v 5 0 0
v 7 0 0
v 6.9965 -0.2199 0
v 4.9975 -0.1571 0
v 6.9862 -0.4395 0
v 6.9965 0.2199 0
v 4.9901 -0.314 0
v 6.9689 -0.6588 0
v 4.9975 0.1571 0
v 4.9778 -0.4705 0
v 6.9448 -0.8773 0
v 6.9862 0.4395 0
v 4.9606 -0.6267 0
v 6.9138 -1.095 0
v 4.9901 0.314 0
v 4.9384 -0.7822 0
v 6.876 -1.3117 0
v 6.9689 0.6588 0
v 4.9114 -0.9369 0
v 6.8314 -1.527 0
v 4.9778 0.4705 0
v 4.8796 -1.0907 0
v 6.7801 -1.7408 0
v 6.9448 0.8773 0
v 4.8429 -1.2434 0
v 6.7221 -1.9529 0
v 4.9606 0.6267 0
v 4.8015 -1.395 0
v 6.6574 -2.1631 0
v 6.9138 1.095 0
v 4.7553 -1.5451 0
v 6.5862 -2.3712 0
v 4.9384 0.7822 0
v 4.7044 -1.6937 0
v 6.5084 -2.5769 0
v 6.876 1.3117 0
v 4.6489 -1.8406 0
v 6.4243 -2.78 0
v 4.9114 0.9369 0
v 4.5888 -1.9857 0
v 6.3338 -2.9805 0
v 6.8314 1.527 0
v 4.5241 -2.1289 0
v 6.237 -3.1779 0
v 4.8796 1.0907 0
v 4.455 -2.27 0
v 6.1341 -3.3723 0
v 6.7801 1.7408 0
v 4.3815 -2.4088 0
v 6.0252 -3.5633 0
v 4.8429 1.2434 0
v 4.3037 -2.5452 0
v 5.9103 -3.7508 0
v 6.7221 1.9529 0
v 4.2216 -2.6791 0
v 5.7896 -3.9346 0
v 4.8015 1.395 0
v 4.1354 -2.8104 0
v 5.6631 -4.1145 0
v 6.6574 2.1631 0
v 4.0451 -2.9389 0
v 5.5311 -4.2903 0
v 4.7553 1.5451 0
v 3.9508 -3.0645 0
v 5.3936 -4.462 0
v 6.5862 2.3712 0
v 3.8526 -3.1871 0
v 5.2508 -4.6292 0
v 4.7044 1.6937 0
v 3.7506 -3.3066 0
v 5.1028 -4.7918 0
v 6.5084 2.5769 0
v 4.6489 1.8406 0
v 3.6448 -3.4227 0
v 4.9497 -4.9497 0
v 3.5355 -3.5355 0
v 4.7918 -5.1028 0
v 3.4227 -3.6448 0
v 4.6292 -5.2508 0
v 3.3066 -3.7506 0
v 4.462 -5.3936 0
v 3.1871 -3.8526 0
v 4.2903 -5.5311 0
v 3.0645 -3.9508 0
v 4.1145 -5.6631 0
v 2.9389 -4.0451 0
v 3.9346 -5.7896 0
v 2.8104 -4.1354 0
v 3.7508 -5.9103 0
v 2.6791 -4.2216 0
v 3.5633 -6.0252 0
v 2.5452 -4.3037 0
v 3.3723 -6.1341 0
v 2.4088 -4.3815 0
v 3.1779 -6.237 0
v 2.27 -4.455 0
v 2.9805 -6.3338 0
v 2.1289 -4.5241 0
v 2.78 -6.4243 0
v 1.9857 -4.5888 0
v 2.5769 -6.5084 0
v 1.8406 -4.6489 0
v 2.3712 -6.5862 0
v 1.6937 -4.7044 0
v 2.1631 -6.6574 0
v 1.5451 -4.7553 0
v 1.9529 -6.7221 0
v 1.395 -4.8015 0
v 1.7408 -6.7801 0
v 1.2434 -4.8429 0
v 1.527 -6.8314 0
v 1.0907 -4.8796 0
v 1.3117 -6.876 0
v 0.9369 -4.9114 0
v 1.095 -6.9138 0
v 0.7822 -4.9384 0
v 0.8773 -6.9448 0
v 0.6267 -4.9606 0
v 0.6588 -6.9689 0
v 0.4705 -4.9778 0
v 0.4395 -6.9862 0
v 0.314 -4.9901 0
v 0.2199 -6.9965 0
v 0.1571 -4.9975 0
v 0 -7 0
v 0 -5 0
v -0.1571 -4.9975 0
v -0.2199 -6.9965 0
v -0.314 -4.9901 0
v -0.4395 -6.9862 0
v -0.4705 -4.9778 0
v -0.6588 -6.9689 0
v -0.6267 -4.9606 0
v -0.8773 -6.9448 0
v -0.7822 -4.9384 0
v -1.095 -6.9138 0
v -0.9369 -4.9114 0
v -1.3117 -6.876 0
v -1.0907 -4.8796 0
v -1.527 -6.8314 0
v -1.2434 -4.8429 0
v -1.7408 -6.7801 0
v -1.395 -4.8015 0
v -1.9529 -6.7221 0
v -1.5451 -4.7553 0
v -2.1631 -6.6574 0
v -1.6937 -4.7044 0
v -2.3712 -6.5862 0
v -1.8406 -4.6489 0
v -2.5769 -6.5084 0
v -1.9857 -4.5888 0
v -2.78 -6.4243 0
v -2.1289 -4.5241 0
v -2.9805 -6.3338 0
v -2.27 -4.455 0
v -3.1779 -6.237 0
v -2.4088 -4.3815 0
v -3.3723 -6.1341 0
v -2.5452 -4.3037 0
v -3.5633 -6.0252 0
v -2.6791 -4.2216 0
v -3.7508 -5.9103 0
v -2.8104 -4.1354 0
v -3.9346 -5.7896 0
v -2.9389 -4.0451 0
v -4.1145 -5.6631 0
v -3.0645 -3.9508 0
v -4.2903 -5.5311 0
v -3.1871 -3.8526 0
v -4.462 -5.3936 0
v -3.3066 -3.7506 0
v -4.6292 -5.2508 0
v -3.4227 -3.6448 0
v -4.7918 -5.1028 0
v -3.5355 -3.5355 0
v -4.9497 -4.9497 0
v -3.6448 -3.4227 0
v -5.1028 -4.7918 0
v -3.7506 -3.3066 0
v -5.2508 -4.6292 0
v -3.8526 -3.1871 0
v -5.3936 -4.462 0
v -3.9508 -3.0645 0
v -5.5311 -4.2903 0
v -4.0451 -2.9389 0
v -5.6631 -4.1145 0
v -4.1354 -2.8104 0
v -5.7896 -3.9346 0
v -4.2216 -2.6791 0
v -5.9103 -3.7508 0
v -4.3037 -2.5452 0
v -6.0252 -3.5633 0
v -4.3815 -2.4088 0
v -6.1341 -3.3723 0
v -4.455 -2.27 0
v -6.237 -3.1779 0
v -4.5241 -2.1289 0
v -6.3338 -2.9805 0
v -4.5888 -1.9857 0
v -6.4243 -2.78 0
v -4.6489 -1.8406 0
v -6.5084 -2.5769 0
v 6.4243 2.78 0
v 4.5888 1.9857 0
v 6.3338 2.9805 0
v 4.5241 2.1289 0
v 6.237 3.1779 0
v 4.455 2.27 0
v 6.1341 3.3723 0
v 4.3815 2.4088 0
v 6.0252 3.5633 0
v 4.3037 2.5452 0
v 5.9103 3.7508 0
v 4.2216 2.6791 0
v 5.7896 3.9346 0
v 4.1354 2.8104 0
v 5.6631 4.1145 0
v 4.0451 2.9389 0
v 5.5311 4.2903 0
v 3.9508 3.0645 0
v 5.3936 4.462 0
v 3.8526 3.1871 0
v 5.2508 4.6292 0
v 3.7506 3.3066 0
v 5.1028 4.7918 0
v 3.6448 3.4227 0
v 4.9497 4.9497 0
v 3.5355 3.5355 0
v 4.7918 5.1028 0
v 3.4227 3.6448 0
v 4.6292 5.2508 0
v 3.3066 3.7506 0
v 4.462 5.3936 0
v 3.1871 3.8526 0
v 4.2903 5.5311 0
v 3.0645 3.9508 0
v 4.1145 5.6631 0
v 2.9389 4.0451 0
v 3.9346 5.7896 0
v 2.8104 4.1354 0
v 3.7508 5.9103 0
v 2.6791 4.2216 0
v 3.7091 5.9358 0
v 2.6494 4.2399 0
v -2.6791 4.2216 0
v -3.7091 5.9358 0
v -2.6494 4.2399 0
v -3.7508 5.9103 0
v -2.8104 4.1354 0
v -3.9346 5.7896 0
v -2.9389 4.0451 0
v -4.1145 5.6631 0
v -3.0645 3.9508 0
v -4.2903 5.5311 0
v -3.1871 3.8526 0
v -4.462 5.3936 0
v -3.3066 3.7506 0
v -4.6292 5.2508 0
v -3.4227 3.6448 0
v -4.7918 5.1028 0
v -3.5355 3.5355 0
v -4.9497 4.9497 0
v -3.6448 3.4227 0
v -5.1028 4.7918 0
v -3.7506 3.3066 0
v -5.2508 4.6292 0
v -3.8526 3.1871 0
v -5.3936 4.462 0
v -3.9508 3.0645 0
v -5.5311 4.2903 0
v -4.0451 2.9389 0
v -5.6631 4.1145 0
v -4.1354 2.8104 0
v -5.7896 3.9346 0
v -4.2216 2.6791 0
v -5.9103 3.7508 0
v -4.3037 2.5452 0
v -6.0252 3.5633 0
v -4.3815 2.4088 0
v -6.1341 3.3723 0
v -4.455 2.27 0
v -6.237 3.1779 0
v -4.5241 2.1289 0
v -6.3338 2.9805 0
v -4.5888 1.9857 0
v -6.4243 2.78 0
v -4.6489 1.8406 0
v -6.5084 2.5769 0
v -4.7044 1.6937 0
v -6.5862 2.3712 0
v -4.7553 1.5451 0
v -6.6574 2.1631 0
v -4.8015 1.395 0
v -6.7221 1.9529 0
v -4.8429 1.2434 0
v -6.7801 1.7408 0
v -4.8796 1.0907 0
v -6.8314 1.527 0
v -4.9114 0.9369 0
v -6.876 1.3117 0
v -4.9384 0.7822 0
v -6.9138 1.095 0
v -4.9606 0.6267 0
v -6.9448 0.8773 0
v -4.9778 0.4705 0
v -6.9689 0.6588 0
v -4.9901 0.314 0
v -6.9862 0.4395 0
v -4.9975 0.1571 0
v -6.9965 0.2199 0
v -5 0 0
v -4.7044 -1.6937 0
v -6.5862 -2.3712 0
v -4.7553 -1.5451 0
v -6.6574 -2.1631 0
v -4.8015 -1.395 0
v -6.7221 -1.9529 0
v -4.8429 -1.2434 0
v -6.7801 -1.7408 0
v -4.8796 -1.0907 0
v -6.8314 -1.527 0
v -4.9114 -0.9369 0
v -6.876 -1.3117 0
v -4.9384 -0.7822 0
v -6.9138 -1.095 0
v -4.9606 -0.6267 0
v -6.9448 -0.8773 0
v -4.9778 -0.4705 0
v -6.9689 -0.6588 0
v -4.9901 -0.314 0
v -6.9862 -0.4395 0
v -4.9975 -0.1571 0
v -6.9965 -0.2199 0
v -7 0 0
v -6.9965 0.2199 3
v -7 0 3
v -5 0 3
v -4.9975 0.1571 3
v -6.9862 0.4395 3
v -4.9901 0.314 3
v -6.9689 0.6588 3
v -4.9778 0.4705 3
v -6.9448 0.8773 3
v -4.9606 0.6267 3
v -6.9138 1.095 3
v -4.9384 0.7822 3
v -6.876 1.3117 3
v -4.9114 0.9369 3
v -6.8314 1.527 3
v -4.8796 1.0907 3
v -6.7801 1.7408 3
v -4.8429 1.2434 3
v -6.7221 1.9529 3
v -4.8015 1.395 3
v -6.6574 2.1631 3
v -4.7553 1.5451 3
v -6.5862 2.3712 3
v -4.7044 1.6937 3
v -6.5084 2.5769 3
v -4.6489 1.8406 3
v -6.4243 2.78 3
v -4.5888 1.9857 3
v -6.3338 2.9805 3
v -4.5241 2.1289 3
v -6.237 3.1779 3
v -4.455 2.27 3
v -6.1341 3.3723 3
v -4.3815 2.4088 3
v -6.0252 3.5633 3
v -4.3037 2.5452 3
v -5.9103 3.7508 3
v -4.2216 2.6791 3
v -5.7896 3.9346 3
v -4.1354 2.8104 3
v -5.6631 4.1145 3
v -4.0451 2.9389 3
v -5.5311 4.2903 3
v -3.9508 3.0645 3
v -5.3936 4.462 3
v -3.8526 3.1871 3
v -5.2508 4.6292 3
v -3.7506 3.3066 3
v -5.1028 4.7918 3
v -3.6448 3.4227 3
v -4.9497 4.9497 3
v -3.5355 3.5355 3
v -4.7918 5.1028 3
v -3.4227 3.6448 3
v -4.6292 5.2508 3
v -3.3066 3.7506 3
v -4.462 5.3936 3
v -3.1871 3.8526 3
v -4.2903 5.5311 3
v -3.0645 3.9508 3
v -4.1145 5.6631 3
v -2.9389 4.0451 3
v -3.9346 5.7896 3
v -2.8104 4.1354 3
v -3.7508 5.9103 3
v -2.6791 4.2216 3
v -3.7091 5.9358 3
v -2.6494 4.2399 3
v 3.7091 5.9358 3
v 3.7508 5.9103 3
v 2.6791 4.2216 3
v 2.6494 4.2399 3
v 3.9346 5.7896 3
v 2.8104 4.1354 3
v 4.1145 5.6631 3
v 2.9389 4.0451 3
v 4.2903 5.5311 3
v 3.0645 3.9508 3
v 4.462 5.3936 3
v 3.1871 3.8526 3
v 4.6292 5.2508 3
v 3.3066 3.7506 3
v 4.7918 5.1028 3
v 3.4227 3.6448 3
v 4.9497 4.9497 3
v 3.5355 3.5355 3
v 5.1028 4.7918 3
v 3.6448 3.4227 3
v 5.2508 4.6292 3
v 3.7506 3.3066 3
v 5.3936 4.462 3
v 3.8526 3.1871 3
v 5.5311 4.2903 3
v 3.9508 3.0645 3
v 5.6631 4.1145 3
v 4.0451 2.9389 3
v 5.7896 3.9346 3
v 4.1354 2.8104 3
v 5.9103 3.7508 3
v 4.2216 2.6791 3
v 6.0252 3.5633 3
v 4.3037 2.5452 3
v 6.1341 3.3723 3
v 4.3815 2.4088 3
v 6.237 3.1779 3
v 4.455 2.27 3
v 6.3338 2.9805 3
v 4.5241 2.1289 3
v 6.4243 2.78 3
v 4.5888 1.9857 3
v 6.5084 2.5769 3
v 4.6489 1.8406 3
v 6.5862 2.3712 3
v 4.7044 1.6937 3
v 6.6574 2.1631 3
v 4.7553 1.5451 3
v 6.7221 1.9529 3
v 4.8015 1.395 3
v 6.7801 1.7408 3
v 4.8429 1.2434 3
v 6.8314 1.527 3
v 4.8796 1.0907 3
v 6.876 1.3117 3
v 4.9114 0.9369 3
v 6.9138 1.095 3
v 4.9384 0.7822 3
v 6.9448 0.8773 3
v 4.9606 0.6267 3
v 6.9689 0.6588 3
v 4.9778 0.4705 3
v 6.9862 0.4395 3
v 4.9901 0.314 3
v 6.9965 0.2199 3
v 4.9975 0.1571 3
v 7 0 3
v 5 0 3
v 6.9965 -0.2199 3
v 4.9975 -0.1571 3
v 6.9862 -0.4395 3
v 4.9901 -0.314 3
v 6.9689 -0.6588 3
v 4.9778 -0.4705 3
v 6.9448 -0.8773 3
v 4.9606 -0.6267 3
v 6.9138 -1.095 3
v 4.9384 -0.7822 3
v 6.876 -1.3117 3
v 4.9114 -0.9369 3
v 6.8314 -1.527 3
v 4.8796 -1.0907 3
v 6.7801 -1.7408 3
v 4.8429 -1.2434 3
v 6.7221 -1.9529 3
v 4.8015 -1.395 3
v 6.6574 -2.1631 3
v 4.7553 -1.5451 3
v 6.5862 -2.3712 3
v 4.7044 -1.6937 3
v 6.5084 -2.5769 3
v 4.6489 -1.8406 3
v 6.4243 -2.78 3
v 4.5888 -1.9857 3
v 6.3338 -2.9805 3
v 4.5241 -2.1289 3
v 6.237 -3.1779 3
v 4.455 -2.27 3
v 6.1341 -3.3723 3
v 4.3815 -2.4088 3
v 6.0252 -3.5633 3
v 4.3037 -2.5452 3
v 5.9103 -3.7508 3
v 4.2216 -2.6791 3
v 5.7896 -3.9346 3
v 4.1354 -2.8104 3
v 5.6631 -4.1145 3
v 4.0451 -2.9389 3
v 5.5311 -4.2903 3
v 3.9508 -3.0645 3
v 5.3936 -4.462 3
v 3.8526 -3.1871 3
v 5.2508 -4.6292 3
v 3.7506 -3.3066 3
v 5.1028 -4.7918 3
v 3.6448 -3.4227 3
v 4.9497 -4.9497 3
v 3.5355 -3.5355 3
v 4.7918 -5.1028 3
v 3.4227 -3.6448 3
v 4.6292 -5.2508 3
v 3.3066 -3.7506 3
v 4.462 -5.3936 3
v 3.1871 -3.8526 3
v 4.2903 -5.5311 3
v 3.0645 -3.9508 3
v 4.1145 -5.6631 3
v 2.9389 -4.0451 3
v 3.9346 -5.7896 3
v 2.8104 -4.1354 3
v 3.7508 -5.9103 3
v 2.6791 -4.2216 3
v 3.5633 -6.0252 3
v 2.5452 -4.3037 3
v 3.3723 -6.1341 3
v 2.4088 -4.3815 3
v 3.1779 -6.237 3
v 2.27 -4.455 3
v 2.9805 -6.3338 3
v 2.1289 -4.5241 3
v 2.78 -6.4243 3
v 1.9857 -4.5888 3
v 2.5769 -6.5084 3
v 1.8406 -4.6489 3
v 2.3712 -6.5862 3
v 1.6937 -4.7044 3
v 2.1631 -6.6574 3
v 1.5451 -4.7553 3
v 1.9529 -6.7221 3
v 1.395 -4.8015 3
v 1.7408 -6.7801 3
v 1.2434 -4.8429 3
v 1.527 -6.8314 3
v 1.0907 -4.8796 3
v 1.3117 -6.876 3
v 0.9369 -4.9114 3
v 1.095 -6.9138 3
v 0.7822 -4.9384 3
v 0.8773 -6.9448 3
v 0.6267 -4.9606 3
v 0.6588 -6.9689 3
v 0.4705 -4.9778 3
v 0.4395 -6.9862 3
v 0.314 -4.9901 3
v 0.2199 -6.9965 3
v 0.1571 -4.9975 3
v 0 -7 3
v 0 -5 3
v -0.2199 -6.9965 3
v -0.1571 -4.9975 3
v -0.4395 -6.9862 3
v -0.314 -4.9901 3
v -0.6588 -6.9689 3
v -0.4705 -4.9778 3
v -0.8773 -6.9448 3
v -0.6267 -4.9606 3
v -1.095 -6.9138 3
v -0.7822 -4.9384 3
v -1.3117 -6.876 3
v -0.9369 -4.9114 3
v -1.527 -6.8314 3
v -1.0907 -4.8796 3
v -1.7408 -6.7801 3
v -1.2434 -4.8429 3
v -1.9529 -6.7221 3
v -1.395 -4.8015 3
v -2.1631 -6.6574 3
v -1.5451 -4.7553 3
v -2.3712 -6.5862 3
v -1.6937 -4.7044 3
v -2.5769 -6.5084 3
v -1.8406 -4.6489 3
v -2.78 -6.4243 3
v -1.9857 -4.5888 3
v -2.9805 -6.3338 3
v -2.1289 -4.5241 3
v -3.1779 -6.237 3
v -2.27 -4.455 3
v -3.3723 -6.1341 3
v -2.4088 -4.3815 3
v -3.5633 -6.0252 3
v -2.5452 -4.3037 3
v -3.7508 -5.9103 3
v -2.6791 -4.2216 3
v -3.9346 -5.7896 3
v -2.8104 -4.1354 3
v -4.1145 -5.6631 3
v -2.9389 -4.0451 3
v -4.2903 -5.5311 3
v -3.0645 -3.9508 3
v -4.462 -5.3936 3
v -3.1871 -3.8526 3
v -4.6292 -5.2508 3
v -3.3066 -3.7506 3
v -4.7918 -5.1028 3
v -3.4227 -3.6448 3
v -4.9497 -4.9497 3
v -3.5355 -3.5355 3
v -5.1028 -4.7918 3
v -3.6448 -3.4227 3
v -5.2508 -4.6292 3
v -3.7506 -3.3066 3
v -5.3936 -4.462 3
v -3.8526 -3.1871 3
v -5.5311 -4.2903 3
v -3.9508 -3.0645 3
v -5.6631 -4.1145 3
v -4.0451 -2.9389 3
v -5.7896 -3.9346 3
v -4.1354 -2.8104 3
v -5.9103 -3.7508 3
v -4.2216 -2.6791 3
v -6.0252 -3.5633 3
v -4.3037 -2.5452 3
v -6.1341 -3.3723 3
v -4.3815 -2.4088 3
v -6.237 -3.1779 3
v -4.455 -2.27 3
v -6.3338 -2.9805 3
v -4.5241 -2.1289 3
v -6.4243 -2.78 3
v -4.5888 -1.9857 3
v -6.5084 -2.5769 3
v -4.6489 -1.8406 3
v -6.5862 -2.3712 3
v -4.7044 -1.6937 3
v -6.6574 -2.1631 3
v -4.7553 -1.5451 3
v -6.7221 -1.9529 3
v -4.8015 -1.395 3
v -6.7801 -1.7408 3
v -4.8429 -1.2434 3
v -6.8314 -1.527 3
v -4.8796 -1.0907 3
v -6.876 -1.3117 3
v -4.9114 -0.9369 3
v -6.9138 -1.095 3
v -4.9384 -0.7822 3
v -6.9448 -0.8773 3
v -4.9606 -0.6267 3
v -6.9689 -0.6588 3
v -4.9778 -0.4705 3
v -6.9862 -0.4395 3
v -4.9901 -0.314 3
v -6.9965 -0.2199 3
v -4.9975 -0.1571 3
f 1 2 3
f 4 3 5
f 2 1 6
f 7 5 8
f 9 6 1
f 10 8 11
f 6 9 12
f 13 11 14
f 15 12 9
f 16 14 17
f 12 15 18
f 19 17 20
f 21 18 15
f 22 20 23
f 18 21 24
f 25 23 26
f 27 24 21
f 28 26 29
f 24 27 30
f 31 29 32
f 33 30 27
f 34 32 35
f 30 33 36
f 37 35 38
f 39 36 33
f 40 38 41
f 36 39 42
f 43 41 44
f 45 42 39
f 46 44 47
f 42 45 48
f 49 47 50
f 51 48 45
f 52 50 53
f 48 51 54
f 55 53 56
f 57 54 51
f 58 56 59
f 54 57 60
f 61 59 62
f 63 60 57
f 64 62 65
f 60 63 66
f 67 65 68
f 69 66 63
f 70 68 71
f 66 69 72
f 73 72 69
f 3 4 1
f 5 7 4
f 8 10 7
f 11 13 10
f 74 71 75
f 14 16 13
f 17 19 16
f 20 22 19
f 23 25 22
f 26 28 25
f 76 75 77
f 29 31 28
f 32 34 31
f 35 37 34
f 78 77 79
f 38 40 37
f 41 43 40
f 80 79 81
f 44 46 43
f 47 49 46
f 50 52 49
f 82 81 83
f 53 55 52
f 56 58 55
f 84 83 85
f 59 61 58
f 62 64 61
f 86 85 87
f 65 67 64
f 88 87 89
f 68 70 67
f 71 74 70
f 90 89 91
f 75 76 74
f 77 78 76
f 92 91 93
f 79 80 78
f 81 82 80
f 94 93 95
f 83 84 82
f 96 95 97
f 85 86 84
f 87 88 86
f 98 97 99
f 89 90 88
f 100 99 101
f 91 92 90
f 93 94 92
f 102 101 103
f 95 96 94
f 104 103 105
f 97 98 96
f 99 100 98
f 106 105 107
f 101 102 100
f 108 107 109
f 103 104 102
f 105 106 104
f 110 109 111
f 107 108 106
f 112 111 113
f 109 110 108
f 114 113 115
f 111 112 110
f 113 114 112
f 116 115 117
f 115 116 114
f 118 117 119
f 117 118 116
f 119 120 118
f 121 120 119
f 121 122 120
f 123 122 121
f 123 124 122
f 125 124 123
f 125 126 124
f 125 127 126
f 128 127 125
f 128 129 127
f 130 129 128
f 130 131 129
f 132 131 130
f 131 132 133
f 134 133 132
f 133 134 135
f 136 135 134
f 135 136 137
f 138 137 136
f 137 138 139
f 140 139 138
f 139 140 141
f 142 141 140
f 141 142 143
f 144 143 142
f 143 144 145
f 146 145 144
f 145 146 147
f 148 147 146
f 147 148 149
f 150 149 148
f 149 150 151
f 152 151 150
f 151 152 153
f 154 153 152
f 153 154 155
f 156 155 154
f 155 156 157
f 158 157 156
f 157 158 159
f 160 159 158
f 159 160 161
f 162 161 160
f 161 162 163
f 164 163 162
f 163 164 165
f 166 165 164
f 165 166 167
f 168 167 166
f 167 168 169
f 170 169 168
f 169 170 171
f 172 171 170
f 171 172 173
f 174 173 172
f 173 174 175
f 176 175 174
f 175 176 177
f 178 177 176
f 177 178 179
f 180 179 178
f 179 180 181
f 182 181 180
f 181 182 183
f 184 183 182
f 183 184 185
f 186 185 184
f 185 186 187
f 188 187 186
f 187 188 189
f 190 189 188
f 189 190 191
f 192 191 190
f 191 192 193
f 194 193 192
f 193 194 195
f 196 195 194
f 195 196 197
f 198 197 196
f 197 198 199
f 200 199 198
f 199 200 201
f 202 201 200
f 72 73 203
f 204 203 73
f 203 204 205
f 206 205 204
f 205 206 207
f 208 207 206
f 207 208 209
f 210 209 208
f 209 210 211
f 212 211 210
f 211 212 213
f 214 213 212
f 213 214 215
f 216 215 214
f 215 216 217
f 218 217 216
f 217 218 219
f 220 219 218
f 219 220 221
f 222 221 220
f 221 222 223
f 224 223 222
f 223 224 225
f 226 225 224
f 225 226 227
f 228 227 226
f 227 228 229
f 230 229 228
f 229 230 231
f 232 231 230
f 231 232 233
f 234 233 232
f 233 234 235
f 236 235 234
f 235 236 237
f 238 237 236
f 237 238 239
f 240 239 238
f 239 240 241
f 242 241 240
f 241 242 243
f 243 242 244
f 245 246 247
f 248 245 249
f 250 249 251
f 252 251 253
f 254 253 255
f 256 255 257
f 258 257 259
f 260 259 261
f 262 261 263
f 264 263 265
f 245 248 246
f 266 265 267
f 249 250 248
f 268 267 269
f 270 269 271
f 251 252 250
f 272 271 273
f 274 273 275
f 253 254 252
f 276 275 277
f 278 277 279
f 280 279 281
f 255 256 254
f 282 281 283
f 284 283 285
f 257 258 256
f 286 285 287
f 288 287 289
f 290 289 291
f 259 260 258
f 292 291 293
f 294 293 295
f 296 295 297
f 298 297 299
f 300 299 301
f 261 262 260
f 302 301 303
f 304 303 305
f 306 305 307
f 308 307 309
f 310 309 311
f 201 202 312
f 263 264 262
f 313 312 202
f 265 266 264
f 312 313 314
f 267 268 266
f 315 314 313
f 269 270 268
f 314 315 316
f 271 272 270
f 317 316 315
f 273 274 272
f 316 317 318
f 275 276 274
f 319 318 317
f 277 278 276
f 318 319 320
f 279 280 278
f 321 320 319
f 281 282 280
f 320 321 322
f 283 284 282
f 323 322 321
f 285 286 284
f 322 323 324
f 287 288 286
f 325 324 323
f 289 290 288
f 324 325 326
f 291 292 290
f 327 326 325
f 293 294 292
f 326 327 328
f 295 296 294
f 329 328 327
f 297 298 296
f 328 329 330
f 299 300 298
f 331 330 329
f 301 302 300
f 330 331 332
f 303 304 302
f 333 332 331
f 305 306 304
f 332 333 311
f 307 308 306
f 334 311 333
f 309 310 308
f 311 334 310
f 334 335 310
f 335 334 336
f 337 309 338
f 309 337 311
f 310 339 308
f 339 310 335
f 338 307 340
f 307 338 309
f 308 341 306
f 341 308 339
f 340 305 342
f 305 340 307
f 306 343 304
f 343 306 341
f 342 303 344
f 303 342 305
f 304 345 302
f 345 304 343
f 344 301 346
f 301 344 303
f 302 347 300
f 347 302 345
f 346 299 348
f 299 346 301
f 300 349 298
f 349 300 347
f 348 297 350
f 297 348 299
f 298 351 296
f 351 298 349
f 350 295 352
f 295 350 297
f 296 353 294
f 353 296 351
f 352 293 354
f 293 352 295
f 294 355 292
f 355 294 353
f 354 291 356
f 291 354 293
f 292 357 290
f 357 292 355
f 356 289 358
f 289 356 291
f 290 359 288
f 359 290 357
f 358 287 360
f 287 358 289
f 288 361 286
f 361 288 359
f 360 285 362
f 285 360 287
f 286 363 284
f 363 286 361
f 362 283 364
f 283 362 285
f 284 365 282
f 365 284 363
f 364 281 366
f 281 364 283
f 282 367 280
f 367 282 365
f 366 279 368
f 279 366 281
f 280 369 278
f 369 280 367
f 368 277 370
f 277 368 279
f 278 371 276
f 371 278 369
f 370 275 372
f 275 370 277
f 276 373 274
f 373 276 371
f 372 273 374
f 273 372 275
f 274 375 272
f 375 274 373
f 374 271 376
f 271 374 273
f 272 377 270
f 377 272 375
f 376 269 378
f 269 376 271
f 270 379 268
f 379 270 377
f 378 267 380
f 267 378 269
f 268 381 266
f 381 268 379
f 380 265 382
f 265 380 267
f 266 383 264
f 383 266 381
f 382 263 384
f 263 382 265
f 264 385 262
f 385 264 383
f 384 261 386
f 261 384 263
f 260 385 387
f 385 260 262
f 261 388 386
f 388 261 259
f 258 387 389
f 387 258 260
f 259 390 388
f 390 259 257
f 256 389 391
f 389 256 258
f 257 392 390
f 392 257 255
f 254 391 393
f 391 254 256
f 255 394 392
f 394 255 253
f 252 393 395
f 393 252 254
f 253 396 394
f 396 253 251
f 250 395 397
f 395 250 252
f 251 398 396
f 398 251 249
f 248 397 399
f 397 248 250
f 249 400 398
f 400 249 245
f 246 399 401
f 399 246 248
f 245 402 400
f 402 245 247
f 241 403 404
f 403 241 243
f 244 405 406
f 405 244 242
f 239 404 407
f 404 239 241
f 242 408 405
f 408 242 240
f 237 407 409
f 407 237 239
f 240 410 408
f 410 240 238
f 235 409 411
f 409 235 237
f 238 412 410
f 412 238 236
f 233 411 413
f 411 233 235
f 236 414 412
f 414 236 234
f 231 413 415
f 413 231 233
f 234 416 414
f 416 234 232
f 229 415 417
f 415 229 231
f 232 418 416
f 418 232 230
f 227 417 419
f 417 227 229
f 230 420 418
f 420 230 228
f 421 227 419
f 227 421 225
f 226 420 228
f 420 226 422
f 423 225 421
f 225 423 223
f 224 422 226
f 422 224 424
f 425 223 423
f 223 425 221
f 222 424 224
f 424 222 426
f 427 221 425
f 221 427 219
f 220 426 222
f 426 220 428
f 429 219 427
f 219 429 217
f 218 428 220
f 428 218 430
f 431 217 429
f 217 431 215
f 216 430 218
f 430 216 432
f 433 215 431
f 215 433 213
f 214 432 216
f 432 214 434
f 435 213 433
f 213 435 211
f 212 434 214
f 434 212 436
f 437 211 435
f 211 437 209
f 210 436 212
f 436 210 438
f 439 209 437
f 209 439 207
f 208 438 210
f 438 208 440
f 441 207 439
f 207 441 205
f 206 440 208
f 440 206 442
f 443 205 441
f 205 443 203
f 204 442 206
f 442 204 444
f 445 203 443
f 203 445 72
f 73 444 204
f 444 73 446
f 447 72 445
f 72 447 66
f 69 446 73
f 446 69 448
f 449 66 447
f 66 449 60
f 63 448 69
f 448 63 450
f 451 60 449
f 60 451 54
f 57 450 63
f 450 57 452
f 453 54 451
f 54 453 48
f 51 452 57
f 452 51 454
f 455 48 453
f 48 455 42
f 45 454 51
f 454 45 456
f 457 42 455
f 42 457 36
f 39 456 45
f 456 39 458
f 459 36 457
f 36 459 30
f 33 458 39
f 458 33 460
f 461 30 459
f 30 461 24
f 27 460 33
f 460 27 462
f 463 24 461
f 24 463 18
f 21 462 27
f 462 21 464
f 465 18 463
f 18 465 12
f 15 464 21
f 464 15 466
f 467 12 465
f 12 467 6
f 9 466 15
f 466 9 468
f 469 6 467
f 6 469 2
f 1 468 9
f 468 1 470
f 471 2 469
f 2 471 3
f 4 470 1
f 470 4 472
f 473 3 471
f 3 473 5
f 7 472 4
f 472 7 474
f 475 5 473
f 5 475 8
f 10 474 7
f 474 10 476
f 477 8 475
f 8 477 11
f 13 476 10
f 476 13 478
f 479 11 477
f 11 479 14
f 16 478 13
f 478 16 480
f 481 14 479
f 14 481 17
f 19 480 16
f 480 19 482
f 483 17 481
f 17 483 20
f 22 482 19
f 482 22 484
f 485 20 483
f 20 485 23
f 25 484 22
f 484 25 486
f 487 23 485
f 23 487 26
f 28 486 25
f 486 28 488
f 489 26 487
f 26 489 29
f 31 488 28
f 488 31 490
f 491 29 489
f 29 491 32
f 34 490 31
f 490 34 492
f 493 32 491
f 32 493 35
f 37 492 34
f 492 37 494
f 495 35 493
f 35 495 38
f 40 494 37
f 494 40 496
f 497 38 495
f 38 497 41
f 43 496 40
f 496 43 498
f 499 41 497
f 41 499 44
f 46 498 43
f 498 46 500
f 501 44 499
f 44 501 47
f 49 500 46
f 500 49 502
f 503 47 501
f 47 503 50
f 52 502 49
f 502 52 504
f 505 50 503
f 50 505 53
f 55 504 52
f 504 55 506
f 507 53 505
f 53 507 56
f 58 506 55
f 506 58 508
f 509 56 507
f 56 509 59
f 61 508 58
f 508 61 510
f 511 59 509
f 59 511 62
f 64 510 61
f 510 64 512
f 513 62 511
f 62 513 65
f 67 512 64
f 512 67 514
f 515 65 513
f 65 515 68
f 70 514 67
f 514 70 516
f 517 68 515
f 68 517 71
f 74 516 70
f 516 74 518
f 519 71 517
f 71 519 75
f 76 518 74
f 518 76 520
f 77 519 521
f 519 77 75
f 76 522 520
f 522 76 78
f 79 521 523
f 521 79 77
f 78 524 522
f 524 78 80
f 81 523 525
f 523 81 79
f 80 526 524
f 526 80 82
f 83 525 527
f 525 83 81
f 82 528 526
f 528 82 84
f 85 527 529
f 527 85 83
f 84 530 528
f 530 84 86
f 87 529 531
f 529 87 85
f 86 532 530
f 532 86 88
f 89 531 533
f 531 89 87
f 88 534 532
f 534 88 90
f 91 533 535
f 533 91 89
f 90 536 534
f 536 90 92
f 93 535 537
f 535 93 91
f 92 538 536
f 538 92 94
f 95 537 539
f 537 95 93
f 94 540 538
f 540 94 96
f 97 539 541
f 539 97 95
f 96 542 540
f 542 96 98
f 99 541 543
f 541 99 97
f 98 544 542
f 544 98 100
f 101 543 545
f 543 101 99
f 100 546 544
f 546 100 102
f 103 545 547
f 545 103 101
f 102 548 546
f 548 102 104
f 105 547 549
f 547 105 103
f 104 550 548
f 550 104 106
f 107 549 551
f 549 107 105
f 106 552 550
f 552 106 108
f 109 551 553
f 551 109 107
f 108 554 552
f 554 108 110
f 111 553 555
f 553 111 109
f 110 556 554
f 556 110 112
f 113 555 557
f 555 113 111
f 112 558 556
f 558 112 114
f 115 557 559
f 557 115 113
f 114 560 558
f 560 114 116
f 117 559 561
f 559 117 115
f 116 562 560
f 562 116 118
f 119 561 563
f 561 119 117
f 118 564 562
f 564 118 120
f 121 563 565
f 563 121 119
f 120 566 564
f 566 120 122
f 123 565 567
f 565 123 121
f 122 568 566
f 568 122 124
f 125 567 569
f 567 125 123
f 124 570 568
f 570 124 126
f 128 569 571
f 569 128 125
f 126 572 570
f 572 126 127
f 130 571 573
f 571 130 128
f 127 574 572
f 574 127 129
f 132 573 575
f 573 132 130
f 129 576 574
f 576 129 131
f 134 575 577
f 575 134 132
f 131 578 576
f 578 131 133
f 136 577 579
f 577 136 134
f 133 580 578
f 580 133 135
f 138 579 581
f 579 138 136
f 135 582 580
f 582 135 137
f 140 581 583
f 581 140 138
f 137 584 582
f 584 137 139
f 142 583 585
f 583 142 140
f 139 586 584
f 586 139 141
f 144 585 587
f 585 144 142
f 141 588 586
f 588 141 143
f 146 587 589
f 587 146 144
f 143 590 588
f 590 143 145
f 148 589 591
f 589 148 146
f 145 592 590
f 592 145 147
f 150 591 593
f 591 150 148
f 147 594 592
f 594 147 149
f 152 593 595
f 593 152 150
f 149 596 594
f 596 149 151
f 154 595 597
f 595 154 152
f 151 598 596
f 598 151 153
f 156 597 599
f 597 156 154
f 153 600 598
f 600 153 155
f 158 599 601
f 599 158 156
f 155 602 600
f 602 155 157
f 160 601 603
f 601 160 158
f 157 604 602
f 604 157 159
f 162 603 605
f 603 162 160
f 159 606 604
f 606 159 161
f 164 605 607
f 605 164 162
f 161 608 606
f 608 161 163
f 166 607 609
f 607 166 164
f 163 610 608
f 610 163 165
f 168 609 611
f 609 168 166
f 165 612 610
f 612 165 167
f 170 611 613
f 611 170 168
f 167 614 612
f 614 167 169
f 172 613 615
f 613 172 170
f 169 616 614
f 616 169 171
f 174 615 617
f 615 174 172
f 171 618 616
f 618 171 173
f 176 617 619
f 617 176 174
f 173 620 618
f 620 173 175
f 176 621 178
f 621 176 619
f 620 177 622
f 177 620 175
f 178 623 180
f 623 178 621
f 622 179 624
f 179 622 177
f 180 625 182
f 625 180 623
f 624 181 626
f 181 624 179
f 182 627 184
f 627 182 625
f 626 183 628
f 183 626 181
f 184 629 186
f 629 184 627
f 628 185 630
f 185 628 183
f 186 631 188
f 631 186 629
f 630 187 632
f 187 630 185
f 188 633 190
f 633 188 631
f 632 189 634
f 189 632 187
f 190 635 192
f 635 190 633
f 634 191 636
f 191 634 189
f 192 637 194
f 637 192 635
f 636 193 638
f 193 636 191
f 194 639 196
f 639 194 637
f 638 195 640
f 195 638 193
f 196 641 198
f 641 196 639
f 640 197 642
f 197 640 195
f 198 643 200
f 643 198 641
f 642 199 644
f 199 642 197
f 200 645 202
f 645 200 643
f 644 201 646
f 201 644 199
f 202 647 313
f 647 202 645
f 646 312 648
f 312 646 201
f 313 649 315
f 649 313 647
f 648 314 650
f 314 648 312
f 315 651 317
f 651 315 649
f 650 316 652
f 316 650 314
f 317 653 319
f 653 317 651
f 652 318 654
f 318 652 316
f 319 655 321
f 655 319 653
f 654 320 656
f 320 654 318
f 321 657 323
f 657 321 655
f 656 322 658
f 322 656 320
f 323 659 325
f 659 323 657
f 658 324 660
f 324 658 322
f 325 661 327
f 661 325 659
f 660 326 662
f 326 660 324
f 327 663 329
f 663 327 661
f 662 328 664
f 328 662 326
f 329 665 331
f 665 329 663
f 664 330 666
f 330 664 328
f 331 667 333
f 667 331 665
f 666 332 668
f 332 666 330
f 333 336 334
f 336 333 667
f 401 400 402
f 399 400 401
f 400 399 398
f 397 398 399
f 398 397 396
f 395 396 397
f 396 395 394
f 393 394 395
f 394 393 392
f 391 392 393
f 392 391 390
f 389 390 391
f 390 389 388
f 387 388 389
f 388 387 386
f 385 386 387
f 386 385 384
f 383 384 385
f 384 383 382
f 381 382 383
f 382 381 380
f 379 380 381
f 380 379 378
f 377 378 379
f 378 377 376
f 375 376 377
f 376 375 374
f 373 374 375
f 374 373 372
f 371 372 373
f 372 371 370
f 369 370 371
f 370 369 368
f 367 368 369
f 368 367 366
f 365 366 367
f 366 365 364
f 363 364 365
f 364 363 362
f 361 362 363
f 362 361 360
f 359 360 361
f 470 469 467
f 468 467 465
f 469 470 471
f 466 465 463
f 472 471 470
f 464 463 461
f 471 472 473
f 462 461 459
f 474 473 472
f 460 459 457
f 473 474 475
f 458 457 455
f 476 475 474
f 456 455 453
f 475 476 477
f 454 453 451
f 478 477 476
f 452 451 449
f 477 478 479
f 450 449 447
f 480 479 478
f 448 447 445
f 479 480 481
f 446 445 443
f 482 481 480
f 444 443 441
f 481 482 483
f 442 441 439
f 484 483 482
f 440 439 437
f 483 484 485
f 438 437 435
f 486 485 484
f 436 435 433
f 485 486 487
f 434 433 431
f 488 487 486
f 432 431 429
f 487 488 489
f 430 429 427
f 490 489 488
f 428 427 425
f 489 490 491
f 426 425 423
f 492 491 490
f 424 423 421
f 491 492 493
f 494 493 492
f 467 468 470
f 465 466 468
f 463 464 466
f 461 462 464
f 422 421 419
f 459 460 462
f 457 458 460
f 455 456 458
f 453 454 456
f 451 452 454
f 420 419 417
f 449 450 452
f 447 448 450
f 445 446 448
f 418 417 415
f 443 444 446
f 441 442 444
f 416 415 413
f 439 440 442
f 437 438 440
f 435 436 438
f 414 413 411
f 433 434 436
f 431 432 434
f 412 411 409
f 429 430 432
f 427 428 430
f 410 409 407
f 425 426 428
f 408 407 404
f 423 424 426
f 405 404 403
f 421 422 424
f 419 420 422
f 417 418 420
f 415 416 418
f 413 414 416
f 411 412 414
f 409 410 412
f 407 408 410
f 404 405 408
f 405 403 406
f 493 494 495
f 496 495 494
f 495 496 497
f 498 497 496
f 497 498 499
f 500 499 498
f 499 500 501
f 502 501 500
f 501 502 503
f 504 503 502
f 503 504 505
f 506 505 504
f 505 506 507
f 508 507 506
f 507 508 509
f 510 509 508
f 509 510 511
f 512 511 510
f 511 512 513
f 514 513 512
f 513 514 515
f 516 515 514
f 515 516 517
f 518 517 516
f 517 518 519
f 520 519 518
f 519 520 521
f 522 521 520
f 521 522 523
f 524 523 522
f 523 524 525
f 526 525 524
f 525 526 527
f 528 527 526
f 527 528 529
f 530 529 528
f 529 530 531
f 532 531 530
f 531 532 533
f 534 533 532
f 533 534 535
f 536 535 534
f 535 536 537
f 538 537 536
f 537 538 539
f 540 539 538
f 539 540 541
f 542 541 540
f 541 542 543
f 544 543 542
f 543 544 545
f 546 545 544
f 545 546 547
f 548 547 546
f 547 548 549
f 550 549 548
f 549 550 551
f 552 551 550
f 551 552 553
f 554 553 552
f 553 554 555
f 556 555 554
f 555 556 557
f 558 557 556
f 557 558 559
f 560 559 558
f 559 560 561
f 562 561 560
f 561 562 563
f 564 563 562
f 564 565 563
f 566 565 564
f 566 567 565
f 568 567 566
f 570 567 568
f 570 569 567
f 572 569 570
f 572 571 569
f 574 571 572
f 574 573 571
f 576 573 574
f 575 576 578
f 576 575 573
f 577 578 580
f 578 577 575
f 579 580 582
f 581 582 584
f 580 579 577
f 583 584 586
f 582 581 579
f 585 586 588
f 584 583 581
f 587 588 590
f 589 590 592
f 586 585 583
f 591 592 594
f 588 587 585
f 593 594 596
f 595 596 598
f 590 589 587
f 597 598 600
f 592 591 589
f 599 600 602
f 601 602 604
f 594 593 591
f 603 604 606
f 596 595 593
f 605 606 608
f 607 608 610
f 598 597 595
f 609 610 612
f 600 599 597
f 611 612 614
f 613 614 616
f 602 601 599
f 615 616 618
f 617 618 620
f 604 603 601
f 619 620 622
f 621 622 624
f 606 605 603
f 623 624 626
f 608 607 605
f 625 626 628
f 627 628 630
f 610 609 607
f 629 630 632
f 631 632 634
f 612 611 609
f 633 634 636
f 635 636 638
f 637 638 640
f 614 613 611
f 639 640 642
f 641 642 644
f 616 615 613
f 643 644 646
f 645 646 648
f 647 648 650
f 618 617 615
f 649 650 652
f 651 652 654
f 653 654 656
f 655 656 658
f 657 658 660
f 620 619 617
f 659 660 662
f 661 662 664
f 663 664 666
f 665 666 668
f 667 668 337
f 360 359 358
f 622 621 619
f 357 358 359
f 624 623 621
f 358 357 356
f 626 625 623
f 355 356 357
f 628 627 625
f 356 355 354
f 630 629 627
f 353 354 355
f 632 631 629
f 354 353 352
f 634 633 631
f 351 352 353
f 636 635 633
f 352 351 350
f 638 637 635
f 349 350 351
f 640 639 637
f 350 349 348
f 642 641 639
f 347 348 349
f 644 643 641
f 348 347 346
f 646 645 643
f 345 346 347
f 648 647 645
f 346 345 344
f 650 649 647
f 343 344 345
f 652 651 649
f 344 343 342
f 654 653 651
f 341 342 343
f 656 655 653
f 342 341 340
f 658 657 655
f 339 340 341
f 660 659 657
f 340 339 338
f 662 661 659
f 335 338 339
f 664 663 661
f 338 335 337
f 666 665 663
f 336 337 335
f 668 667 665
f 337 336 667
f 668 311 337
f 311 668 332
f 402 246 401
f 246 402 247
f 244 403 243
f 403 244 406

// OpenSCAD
// [FL_INDEX: keywords="openscad, 3d_parametric, Find_your_thing__Clip, csg_solid" | COT="Parametric OpenSCAD design from 3DCodeverse"]
// Title: "Find your thing" Clip

// Inner diameter
diameter = 10;

// Wall thickness
thickness = 2;

// Clip length
length = 3;

// Opening angle
angle = 64;

cutout = diameter*2;

difference() {
  rotate_extrude($fn=200)
    translate([diameter/2,0,0])
      square([thickness, length]);

  translate([0,0,-1])linear_extrude(height=length*2)
    polygon([[0,0],[sin(angle/2)*cutout,cos(angle/2)*cutout],[-sin(angle/2)*cutout,cos(angle/2)*cutout]]);
}
